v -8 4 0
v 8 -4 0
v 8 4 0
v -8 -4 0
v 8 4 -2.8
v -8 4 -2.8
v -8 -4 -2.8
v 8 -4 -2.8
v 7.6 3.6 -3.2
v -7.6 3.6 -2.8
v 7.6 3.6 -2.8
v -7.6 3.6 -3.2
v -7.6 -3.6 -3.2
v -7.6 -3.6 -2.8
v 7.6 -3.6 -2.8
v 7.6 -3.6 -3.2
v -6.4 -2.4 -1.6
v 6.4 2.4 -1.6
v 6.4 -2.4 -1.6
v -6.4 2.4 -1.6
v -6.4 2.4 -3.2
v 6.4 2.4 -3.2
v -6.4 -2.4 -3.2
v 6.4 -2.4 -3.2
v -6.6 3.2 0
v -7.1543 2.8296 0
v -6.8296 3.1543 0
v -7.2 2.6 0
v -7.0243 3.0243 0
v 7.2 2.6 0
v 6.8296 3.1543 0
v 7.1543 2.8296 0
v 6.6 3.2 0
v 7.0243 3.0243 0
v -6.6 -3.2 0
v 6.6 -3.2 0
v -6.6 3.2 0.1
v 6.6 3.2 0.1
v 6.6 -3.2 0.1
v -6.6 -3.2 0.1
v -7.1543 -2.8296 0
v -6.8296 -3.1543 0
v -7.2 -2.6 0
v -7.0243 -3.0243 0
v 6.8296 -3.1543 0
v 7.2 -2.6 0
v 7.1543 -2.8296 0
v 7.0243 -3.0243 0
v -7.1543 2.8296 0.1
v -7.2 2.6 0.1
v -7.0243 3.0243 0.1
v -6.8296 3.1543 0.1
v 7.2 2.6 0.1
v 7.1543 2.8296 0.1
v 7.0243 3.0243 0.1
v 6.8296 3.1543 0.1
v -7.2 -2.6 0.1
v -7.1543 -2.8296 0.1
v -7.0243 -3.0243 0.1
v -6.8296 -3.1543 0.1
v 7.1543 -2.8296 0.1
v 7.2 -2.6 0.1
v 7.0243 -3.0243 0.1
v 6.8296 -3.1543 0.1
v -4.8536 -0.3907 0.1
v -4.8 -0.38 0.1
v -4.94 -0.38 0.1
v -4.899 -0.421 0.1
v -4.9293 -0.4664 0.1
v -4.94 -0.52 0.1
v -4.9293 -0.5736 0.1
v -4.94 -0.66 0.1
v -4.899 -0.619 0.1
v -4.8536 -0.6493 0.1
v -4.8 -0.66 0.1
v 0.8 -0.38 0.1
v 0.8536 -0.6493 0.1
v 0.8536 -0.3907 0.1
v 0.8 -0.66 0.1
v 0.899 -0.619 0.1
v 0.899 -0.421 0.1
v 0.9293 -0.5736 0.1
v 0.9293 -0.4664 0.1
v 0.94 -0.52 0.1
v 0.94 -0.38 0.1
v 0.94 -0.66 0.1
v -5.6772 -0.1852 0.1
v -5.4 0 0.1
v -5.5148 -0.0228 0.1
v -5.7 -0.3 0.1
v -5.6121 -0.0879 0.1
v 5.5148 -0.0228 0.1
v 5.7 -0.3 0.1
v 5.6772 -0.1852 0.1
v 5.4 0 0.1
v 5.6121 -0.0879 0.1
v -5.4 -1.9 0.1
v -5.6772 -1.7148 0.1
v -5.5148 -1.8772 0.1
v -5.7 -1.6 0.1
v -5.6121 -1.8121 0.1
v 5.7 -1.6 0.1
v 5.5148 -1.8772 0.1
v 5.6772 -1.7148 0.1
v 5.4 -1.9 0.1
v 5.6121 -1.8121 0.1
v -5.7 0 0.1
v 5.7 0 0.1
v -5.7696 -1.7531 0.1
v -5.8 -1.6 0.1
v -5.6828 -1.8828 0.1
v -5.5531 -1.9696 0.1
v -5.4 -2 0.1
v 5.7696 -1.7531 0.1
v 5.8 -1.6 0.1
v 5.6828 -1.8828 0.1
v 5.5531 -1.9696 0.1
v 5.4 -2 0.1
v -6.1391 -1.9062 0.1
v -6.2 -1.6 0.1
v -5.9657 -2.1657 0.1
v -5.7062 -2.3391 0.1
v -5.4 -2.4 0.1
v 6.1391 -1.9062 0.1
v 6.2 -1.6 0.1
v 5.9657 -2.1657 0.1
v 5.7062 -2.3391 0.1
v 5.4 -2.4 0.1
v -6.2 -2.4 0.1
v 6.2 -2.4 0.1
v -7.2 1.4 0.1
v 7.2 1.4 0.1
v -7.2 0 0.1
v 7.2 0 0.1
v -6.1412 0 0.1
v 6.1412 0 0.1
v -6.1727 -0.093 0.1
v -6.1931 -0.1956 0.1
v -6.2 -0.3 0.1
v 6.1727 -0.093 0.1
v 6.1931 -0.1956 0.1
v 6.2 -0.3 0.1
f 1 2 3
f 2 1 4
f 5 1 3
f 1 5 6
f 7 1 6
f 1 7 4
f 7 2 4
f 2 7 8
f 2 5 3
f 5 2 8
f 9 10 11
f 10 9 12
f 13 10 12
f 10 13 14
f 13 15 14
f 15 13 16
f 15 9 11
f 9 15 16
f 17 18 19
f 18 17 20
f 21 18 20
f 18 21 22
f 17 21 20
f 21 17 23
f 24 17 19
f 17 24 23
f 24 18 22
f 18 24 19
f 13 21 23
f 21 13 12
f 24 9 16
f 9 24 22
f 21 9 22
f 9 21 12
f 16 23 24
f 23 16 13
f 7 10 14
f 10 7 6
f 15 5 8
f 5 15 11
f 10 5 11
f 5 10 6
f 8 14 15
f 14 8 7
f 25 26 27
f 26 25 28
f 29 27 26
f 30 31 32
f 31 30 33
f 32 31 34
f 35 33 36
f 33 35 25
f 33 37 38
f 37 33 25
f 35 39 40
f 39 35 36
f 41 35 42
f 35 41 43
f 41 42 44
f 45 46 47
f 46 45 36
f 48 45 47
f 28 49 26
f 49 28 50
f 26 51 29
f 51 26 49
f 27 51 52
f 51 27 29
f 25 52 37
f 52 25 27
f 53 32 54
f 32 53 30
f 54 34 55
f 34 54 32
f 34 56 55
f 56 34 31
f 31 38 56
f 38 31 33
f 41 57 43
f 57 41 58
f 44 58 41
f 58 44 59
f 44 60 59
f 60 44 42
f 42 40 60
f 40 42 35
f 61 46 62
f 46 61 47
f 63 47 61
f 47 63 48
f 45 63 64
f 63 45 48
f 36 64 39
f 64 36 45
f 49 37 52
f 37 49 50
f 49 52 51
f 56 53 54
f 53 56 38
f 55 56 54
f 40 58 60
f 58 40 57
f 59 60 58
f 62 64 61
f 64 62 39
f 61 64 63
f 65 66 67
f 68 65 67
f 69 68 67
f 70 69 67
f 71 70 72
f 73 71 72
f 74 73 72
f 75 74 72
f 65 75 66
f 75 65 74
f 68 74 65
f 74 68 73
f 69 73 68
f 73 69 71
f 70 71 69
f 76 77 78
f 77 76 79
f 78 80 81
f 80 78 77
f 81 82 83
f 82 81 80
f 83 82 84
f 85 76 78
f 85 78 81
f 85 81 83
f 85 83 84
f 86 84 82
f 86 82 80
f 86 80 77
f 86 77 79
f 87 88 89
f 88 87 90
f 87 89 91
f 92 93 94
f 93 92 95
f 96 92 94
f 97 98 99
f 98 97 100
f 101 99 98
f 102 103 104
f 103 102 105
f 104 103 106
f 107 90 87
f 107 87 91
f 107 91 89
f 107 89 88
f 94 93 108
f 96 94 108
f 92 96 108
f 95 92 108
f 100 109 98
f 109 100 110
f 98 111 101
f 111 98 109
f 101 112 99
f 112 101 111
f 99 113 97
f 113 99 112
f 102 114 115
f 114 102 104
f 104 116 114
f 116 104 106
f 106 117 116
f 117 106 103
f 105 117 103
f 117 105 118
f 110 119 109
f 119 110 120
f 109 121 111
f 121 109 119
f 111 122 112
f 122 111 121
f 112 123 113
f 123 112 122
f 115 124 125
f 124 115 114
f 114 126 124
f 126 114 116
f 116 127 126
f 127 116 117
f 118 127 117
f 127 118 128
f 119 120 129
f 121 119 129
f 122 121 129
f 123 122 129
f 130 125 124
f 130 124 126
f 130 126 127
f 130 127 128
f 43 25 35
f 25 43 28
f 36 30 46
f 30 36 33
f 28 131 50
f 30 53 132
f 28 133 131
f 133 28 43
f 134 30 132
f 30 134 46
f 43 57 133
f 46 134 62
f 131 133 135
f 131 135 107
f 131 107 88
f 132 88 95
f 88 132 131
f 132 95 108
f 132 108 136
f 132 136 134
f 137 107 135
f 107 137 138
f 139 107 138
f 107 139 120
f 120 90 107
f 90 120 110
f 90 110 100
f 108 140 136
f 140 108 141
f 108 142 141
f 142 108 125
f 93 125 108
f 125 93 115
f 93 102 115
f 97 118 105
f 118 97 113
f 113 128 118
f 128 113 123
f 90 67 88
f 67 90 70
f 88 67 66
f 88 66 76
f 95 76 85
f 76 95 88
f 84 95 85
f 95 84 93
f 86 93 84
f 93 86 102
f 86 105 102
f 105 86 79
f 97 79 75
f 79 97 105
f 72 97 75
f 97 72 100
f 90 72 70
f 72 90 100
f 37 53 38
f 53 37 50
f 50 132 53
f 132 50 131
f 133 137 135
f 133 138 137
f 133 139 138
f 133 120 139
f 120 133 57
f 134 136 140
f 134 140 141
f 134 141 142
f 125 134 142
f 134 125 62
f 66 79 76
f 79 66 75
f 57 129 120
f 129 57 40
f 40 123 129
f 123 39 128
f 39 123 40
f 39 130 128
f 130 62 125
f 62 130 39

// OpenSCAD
// file: ../p/box5.scad
use <../lib.scad>
function ldraw_lib__box5() = [
// 0 Box with 5 Faces and All Edges
// 0 Name: box5.dat
// 0 Author: James Jessiman
// 0 !LDRAW_ORG Primitive UPDATE 2012-01
// 0 !LICENSE Licensed under CC BY 4.0 : see CAreadme.txt
// 
// 0 BFC CERTIFY CCW
  [0,"BFC","CERTIFY"],
  [0,"BFC","CCW"],
// 
// 0 !HISTORY 2002-04-03 [sbliss] Modified for BFC compliance
// 0 !HISTORY 2002-04-25 [PTadmin] Official Update 2002-02
// 0 !HISTORY 2007-06-24 [PTadmin] Header formatted for Contributor Agreement
// 0 !HISTORY 2008-07-01 [PTadmin] Official Update 2008-01
// 0 !HISTORY 2012-02-16 [Philo] Changed to CCW
// 0 !HISTORY 2012-03-30 [PTadmin] Official Update 2012-01
// 
// 
// 2 24 1 1 1 -1 1 1
  [2,24,1,1,1,-1,1,1],
// 2 24 -1 1 1 -1 1 -1
  [2,24,-1,1,1,-1,1,-1],
// 2 24 -1 1 -1 1 1 -1
  [2,24,-1,1,-1,1,1,-1],
// 2 24 1 1 -1 1 1 1
  [2,24,1,1,-1,1,1,1],
// 2 24 1 0 1 -1 0 1
  [2,24,1,0,1,-1,0,1],
// 2 24 -1 0 1 -1 0 -1
  [2,24,-1,0,1,-1,0,-1],
// 2 24 -1 0 -1 1 0 -1
  [2,24,-1,0,-1,1,0,-1],
// 2 24 1 0 -1 1 0 1
  [2,24,1,0,-1,1,0,1],
// 2 24 1 0 1 1 1 1
  [2,24,1,0,1,1,1,1],
// 2 24 -1 0 1 -1 1 1
  [2,24,-1,0,1,-1,1,1],
// 2 24 1 0 -1 1 1 -1
  [2,24,1,0,-1,1,1,-1],
// 2 24 -1 0 -1 -1 1 -1
  [2,24,-1,0,-1,-1,1,-1],
// 4 16 -1 1 1 1 1 1 1 1 -1 -1 1 -1
  [4,16,-1,1,1,1,1,1,1,1,-1,-1,1,-1],
// 4 16 -1 1 1 -1 0 1 1 0 1 1 1 1
  [4,16,-1,1,1,-1,0,1,1,0,1,1,1,1],
// 4 16 -1 1 -1 -1 0 -1 -1 0 1 -1 1 1
  [4,16,-1,1,-1,-1,0,-1,-1,0,1,-1,1,1],
// 4 16 1 1 -1 1 0 -1 -1 0 -1 -1 1 -1
  [4,16,1,1,-1,1,0,-1,-1,0,-1,-1,1,-1],
// 4 16 1 1 1 1 0 1 1 0 -1 1 1 -1
  [4,16,1,1,1,1,0,1,1,0,-1,1,1,-1],
];
module ldraw_lib__box5(step=0, col=false, unit=2/5, alt=false, line=0.2, solid=!$preview)
    makepoly(ldraw_lib__box5(), step=step, col=col, unit=unit, alt=alt, line=line, solid=solid);
ldraw_lib__box5(line=0.2);
// file: ../p/box4.scad
use <../lib.scad>
function ldraw_lib__box4() = [
// 0 Box with 4 Faces (2 Parallel Pairs) and All Edges
// 0 Name: box4.dat
// 0 Author: James Jessiman
// 0 !LDRAW_ORG Primitive UPDATE 2012-01
// 0 !LICENSE Licensed under CC BY 4.0 : see CAreadme.txt
// 
// 0 BFC CERTIFY CCW
  [0,"BFC","CERTIFY"],
  [0,"BFC","CCW"],
// 
// 0 !HISTORY 2002-04-03 [sbliss] Modified for BFC compliance
// 0 !HISTORY 2002-04-25 [PTadmin] Official Update 2002-02
// 0 !HISTORY 2007-06-24 [PTadmin] Header formatted for Contributor Agreement
// 0 !HISTORY 2008-07-01 [PTadmin] Official Update 2008-01
// 0 !HISTORY 2012-02-16 [Philo] Changed to CCW
// 0 !HISTORY 2012-03-30 [PTadmin] Official Update 2012-01
// 
// 
// 2 24 1 1 1 -1 1 1
  [2,24,1,1,1,-1,1,1],
// 2 24 -1 1 1 -1 1 -1
  [2,24,-1,1,1,-1,1,-1],
// 2 24 -1 1 -1 1 1 -1
  [2,24,-1,1,-1,1,1,-1],
// 2 24 1 1 -1 1 1 1
  [2,24,1,1,-1,1,1,1],
// 2 24 1 0 1 -1 0 1
  [2,24,1,0,1,-1,0,1],
// 2 24 -1 0 1 -1 0 -1
  [2,24,-1,0,1,-1,0,-1],
// 2 24 -1 0 -1 1 0 -1
  [2,24,-1,0,-1,1,0,-1],
// 2 24 1 0 -1 1 0 1
  [2,24,1,0,-1,1,0,1],
// 2 24 1 0 1 1 1 1
  [2,24,1,0,1,1,1,1],
// 2 24 -1 0 1 -1 1 1
  [2,24,-1,0,1,-1,1,1],
// 2 24 1 0 -1 1 1 -1
  [2,24,1,0,-1,1,1,-1],
// 2 24 -1 0 -1 -1 1 -1
  [2,24,-1,0,-1,-1,1,-1],
// 4 16 -1 1 1 -1 0 1 1 0 1 1 1 1
  [4,16,-1,1,1,-1,0,1,1,0,1,1,1,1],
// 4 16 -1 1 -1 -1 0 -1 -1 0 1 -1 1 1
  [4,16,-1,1,-1,-1,0,-1,-1,0,1,-1,1,1],
// 4 16 1 1 -1 1 0 -1 -1 0 -1 -1 1 -1
  [4,16,1,1,-1,1,0,-1,-1,0,-1,-1,1,-1],
// 4 16 1 1 1 1 0 1 1 0 -1 1 1 -1
  [4,16,1,1,1,1,0,1,1,0,-1,1,1,-1],
];
module ldraw_lib__box4(step=0, col=false, unit=2/5, alt=false, line=0.2, solid=!$preview)
    makepoly(ldraw_lib__box4(), step=step, col=col, unit=unit, alt=alt, line=line, solid=solid);
ldraw_lib__box4(line=0.2);
// file: ../p/box3u12.scad
use <../lib.scad>
function ldraw_lib__box3u12() = [
// 0 Box with 3 Parallel Faces without Any Edges
// 0 Name: box3u12.dat
// 0 Author: J.C. Tchang [tchang]
// 0 !LDRAW_ORG Primitive UPDATE 2014-02
// 0 !LICENSE Licensed under CC BY 4.0 : see CAreadme.txt
// 
// 0 BFC CERTIFY CCW
  [0,"BFC","CERTIFY"],
  [0,"BFC","CCW"],
// 
// 0 !HISTORY 2014-12-23 [PTadmin] Official Update 2014-02
// 
// 
// 4 16 -1 1 1 1 1 1 1 1 -1 -1 1 -1
  [4,16,-1,1,1,1,1,1,1,1,-1,-1,1,-1],
// 4 16 -1 1 1 -1 0 1 1 0 1 1 1 1
  [4,16,-1,1,1,-1,0,1,1,0,1,1,1,1],
// 4 16 1 1 -1 1 0 -1 -1 0 -1 -1 1 -1
  [4,16,1,1,-1,1,0,-1,-1,0,-1,-1,1,-1],
];
module ldraw_lib__box3u12(step=0, col=false, unit=2/5, alt=false, line=0.2, solid=!$preview)
    makepoly(ldraw_lib__box3u12(), step=step, col=col, unit=unit, alt=alt, line=line, solid=solid);
ldraw_lib__box3u12(line=0.2);
// file: ../p/2-4ndis.scad
use <../lib.scad>
function ldraw_lib__2_4ndis() = [
// 0 Disc Negative 0.5
// 0 Name: 2-4ndis.dat
// 0 Author: James Jessiman
// 0 !LDRAW_ORG Primitive UPDATE 2012-01
// 0 !LICENSE Licensed under CC BY 4.0 : see CAreadme.txt
// 
// 0 BFC CERTIFY CCW
  [0,"BFC","CERTIFY"],
  [0,"BFC","CCW"],
// 
// 0 !HISTORY 2002-03-23 [sbliss] Added BFC statement; compacted code
// 0 !HISTORY 2002-04-25 [PTadmin] Official Update 2002-02
// 0 !HISTORY 2007-06-24 [PTadmin] Header formatted for Contributor Agreement
// 0 !HISTORY 2008-07-01 [PTadmin] Official Update 2008-01
// 0 !HISTORY 2012-02-16 [Philo] Changed to CCW
// 0 !HISTORY 2012-03-30 [PTadmin] Official Update 2012-01
// 
// 
// 3 16 0.9239 0 0.3827 1 0 0 1 0 1
  [3,16,0.9239,0,0.3827,1,0,0,1,0,1],
// 3 16 0.7071 0 0.7071 0.9239 0 0.3827 1 0 1
  [3,16,0.7071,0,0.7071,0.9239,0,0.3827,1,0,1],
// 3 16 0.3827 0 0.9239 0.7071 0 0.7071 1 0 1
  [3,16,0.3827,0,0.9239,0.7071,0,0.7071,1,0,1],
// 3 16 0 0 1 0.3827 0 0.9239 1 0 1
  [3,16,0,0,1,0.3827,0,0.9239,1,0,1],
// 3 16 -0.3827 0 0.9239 0 0 1 -1 0 1
  [3,16,-0.3827,0,0.9239,0,0,1,-1,0,1],
// 3 16 -0.7071 0 0.7071 -0.3827 0 0.9239 -1 0 1
  [3,16,-0.7071,0,0.7071,-0.3827,0,0.9239,-1,0,1],
// 3 16 -0.9239 0 0.3827 -0.7071 0 0.7071 -1 0 1
  [3,16,-0.9239,0,0.3827,-0.7071,0,0.7071,-1,0,1],
// 3 16 -1 0 0 -0.9239 0 0.3827 -1 0 1
  [3,16,-1,0,0,-0.9239,0,0.3827,-1,0,1],
];
module ldraw_lib__2_4ndis(step=0, col=false, unit=2/5, alt=false, line=0.2, solid=!$preview)
    makepoly(ldraw_lib__2_4ndis(), step=step, col=col, unit=unit, alt=alt, line=line, solid=solid);
ldraw_lib__2_4ndis(line=0.2);
// file: ../p/2-4chrd.scad
use <../lib.scad>
function ldraw_lib__2_4chrd() = [
// 0 Chord 0.5
// 0 Name: 2-4chrd.dat
// 0 Author: Philippe Hurbain [Philo]
// 0 !LDRAW_ORG Primitive UPDATE 2014-01
// 0 !LICENSE Licensed under CC BY 4.0 : see CAreadme.txt
// 
// 0 BFC CERTIFY CCW
  [0,"BFC","CERTIFY"],
  [0,"BFC","CCW"],
// 
// 0 !HISTORY 2014-06-21 [PTadmin] Official Update 2014-01
// 
// 
// 4 16 0.9239 0 0.3827 -0.9239 0 0.3827 -1 0 0 1 0 0
  [4,16,0.9239,0,0.3827,-0.9239,0,0.3827,-1,0,0,1,0,0],
// 4 16 0.7071 0 0.7071 -0.7071 0 0.7071 -0.9239 0 0.3827 0.9239 0 0.3827
  [4,16,0.7071,0,0.7071,-0.7071,0,0.7071,-0.9239,0,0.3827,0.9239,0,0.3827],
// 4 16 0.3827 0 0.9239 -0.3827 0 0.9239 -0.7071 0 0.7071 0.7071 0 0.7071
  [4,16,0.3827,0,0.9239,-0.3827,0,0.9239,-0.7071,0,0.7071,0.7071,0,0.7071],
// 3 16 0 0 1 -0.3827 0 0.9239 0.3827 0 0.9239
  [3,16,0,0,1,-0.3827,0,0.9239,0.3827,0,0.9239],
];
module ldraw_lib__2_4chrd(step=0, col=false, unit=2/5, alt=false, line=0.2, solid=!$preview)
    makepoly(ldraw_lib__2_4chrd(), step=step, col=col, unit=unit, alt=alt, line=line, solid=solid);
ldraw_lib__2_4chrd(line=0.2);
// file: ../p/1-4ring3.scad
use <../lib.scad>
function ldraw_lib__1_4ring3() = [
// 0 Ring  3 x 0.25
// 0 Name: 1-4ring3.dat
// 0 Author: Willy Tschager [Holly-Wood]
// 0 !LDRAW_ORG Primitive UPDATE 2024-01
// 0 !LICENSE Licensed under CC BY 4.0 : see CAreadme.txt
// 
// 0 BFC CERTIFY CCW
  [0,"BFC","CERTIFY"],
  [0,"BFC","CCW"],
// 
// 0 !HISTORY 1999-07-05 [PTadmin] Official Update 1999-05
// 0 !HISTORY 2003-01-21 [cavehop] Update Added BFC and 1 digit of significance
// 0 !HISTORY 2003-05-21 [cavehop] Corrected values as indicated by pneaster
// 0 !HISTORY 2003-06-12 [cavehop] Re-corrected values as indicated by pneaster
// 0 !HISTORY 2003-08-01 [PTadmin] Official Update 2003-02
// 0 !HISTORY 2007-06-22 [PTadmin] Header formatted for Contributor Agreement
// 0 !HISTORY 2008-07-01 [PTadmin] Official Update 2008-01
// 0 !HISTORY 2012-02-16 [Philo] Changed to CCW
// 0 !HISTORY 2012-03-30 [PTadmin] Official Update 2012-01
// 0 !HISTORY 2024-01-04 [Holly-Wood] Complete re-write, original by Karim Nassar
// 0 !HISTORY 2024-01-29 [OrionP] Official Update 2024-01
// 
// 4 16 4 0 0 3.6956 0 1.5308 2.7717 0 1.1481 3 0 0
  [4,16,4,0,0,3.6956,0,1.5308,2.7717,0,1.1481,3,0,0],
// 4 16 3.6956 0 1.5308 2.8284 0 2.8284 2.1213 0 2.1213 2.7717 0 1.1481
  [4,16,3.6956,0,1.5308,2.8284,0,2.8284,2.1213,0,2.1213,2.7717,0,1.1481],
// 4 16 2.8284 0 2.8284 1.5308 0 3.6956 1.1481 0 2.7717 2.1213 0 2.1213
  [4,16,2.8284,0,2.8284,1.5308,0,3.6956,1.1481,0,2.7717,2.1213,0,2.1213],
// 4 16 1.5308 0 3.6956 0 0 4 0 0 3 1.1481 0 2.7717
  [4,16,1.5308,0,3.6956,0,0,4,0,0,3,1.1481,0,2.7717],
// 0 // Build by LDPartEditor (PrimGen 2.X)
];
module ldraw_lib__1_4ring3(step=0, col=false, unit=2/5, alt=false, line=0.2, solid=!$preview)
    makepoly(ldraw_lib__1_4ring3(), step=step, col=col, unit=unit, alt=alt, line=line, solid=solid);
ldraw_lib__1_4ring3(line=0.2);
// file: ../p/1-4ring1.scad
use <../lib.scad>
function ldraw_lib__1_4ring1() = [
// 0 Ring  1 x 0.25
// 0 Name: 1-4ring1.dat
// 0 Author: Chris Dee [cwdee]
// 0 !LDRAW_ORG Primitive UPDATE 2012-01
// 0 !LICENSE Licensed under CC BY 4.0 : see CAreadme.txt
// 
// 0 BFC CERTIFY CCW
  [0,"BFC","CERTIFY"],
  [0,"BFC","CCW"],
// 
// 0 !HISTORY 2000-05-07 [PTadmin] Official Update 2000-01
// 0 !HISTORY 2002-11-22 [hafhead] Added BFC statement
// 0 !HISTORY 2002-11-30 [PTadmin] Official Update 2002-05
// 0 !HISTORY 2007-06-22 [PTadmin] Header formatted for Contributor Agreement
// 0 !HISTORY 2008-07-01 [PTadmin] Official Update 2008-01
// 0 !HISTORY 2012-02-16 [Philo] Changed to CCW
// 0 !HISTORY 2012-03-30 [PTadmin] Official Update 2012-01
// 
// 
// 4 16 2 0 0 1.8478 0 0.7654 0.9239 0 0.3827 1 0 0
  [4,16,2,0,0,1.8478,0,0.7654,0.9239,0,0.3827,1,0,0],
// 4 16 1.8478 0 0.7654 1.4142 0 1.4142 0.7071 0 0.7071 0.9239 0 0.3827
  [4,16,1.8478,0,0.7654,1.4142,0,1.4142,0.7071,0,0.7071,0.9239,0,0.3827],
// 4 16 1.4142 0 1.4142 0.7654 0 1.8478 0.3827 0 0.9239 0.7071 0 0.7071
  [4,16,1.4142,0,1.4142,0.7654,0,1.8478,0.3827,0,0.9239,0.7071,0,0.7071],
// 4 16 0.7654 0 1.8478 0 0 2 0 0 1 0.3827 0 0.9239
  [4,16,0.7654,0,1.8478,0,0,2,0,0,1,0.3827,0,0.9239],
];
module ldraw_lib__1_4ring1(step=0, col=false, unit=2/5, alt=false, line=0.2, solid=!$preview)
    makepoly(ldraw_lib__1_4ring1(), step=step, col=col, unit=unit, alt=alt, line=line, solid=solid);
ldraw_lib__1_4ring1(line=0.2);
// file: ../p/1-4ndis.scad
use <../lib.scad>
function ldraw_lib__1_4ndis() = [
// 0 Disc Negative 0.25
// 0 Name: 1-4ndis.dat
// 0 Author: James Jessiman
// 0 !LDRAW_ORG Primitive UPDATE 2012-01
// 0 !LICENSE Licensed under CC BY 4.0 : see CAreadme.txt
// 
// 0 BFC CERTIFY CCW
  [0,"BFC","CERTIFY"],
  [0,"BFC","CCW"],
// 
// 0 !HISTORY 2002-03-23 [sbliss] Added BFC Statement
// 0 !HISTORY 2002-04-25 [PTadmin] Official Update 2002-02
// 0 !HISTORY 2007-06-22 [PTadmin] Header formatted for Contributor Agreement
// 0 !HISTORY 2008-07-01 [PTadmin] Official Update 2008-01
// 0 !HISTORY 2012-02-16 [Philo] Changed to CCW
// 0 !HISTORY 2012-03-30 [PTadmin] Official Update 2012-01
// 
// 
// 3 16 0.9239 0 0.3827 1 0 0 1 0 1
  [3,16,0.9239,0,0.3827,1,0,0,1,0,1],
// 3 16 0.7071 0 0.7071 0.9239 0 0.3827 1 0 1
  [3,16,0.7071,0,0.7071,0.9239,0,0.3827,1,0,1],
// 3 16 0.3827 0 0.9239 0.7071 0 0.7071 1 0 1
  [3,16,0.3827,0,0.9239,0.7071,0,0.7071,1,0,1],
// 3 16 0 0 1 0.3827 0 0.9239 1 0 1
  [3,16,0,0,1,0.3827,0,0.9239,1,0,1],
];
module ldraw_lib__1_4ndis(step=0, col=false, unit=2/5, alt=false, line=0.2, solid=!$preview)
    makepoly(ldraw_lib__1_4ndis(), step=step, col=col, unit=unit, alt=alt, line=line, solid=solid);
ldraw_lib__1_4ndis(line=0.2);
// file: ../p/1-4cyli.scad
use <../lib.scad>
function ldraw_lib__1_4cyli() = [
// 0 Cylinder 0.25
// 0 Name: 1-4cyli.dat
// 0 Author: James Jessiman
// 0 !LDRAW_ORG Primitive UPDATE 2012-01
// 0 !LICENSE Licensed under CC BY 4.0 : see CAreadme.txt
// 
// 0 BFC CERTIFY CCW
  [0,"BFC","CERTIFY"],
  [0,"BFC","CCW"],
// 
// 0 !HISTORY 2002-03-23 [sbliss] Added BFC statement.
// 0 !HISTORY 2002-04-25 [PTadmin] Official Update 2002-02
// 0 !HISTORY 2007-06-22 [PTadmin] Header formatted for Contributor Agreement
// 0 !HISTORY 2008-07-01 [PTadmin] Official Update 2008-01
// 0 !HISTORY 2012-02-16 [Philo] Changed to CCW
// 0 !HISTORY 2012-03-30 [PTadmin] Official Update 2012-01
// 
// 
// 4 16 1 1 0 0.9239 1 0.3827 0.9239 0 0.3827 1 0 0
  [4,16,1,1,0,0.9239,1,0.3827,0.9239,0,0.3827,1,0,0],
// 5 24 1 0 0 1 1 0 0.9239 0 0.3827 1 0 -1
  [5,24,1,0,0,1,1,0,0.9239,0,0.3827,1,0,-1],
// 4 16 0.9239 1 0.3827 0.7071 1 0.7071 0.7071 0 0.7071 0.9239 0 0.3827
  [4,16,0.9239,1,0.3827,0.7071,1,0.7071,0.7071,0,0.7071,0.9239,0,0.3827],
// 5 24 0.9239 0 0.3827 0.9239 1 0.3827 0.7071 0 0.7071 1 0 0
  [5,24,0.9239,0,0.3827,0.9239,1,0.3827,0.7071,0,0.7071,1,0,0],
// 4 16 0.7071 1 0.7071 0.3827 1 0.9239 0.3827 0 0.9239 0.7071 0 0.7071
  [4,16,0.7071,1,0.7071,0.3827,1,0.9239,0.3827,0,0.9239,0.7071,0,0.7071],
// 5 24 0.7071 0 0.7071 0.7071 1 0.7071 0.3827 0 0.9239 0.9239 0 0.3827
  [5,24,0.7071,0,0.7071,0.7071,1,0.7071,0.3827,0,0.9239,0.9239,0,0.3827],
// 4 16 0.3827 1 0.9239 0 1 1 0 0 1 0.3827 0 0.9239
  [4,16,0.3827,1,0.9239,0,1,1,0,0,1,0.3827,0,0.9239],
// 5 24 0.3827 0 0.9239 0.3827 1 0.9239 0 0 1 0.7071 0 0.7071
  [5,24,0.3827,0,0.9239,0.3827,1,0.9239,0,0,1,0.7071,0,0.7071],
// 5 24 0 0 1 0 1 1 0.3827 0 0.9239 -1 0 1
  [5,24,0,0,1,0,1,1,0.3827,0,0.9239,-1,0,1],
];
module ldraw_lib__1_4cyli(step=0, col=false, unit=2/5, alt=false, line=0.2, solid=!$preview)
    makepoly(ldraw_lib__1_4cyli(), step=step, col=col, unit=unit, alt=alt, line=line, solid=solid);
ldraw_lib__1_4cyli(line=0.2);
// file: ../p/1-4chrd.scad
use <../lib.scad>
function ldraw_lib__1_4chrd() = [
// 0 Chord 0.25
// 0 Name: 1-4chrd.dat
// 0 Author: Max Martin Richter [MMR1988]
// 0 !LDRAW_ORG Primitive UPDATE 2023-05
// 0 !LICENSE Licensed under CC BY 4.0 : see CAreadme.txt
// 
// 0 BFC CERTIFY CCW
  [0,"BFC","CERTIFY"],
  [0,"BFC","CCW"],
// 
// 0 !HISTORY 2004-04-22 [PTadmin] Official Update 2004-02
// 0 !HISTORY 2007-10-09 [PTadmin] Header formatted for Contributor Agreement
// 0 !HISTORY 2008-07-01 [PTadmin] Official Update 2008-01
// 0 !HISTORY 2012-08-02 [MMR1988] Re-creation with PrimGen2 and Rectifier
// 0 !HISTORY 2012-08-09 [PTadmin] Official Update 2012-02
// 0 !HISTORY 2023-10-27 [OrionP] Change author to MMR1988 from hafhead
// 0 !HISTORY 2023-10-31 [OrionP] Official Update 2023-05
// 
// 4 16 0.9239 0 0.3827 0.3827 0 0.9239 0 0 1 1 0 0
  [4,16,0.9239,0,0.3827,0.3827,0,0.9239,0,0,1,1,0,0],
// 3 16 0.7071 0 0.7071 0.3827 0 0.9239 0.9239 0 0.3827
  [3,16,0.7071,0,0.7071,0.3827,0,0.9239,0.9239,0,0.3827],
];
module ldraw_lib__1_4chrd(step=0, col=false, unit=2/5, alt=false, line=0.2, solid=!$preview)
    makepoly(ldraw_lib__1_4chrd(), step=step, col=col, unit=unit, alt=alt, line=line, solid=solid);
ldraw_lib__1_4chrd(line=0.2);
// file: s/3069bs01.scad
use <../../lib.scad>
use <../../p/box4.scad>
use <../../p/box5.scad>
function ldraw_lib__s__3069bs01() = [
// 0 ~Tile  1 x  2 with Groove without Top Face
// 0 Name: s\3069bs01.dat
// 0 Author: Santeri Piippo [arezey]
// 0 !LDRAW_ORG Subpart UPDATE 2010-02
// 0 !LICENSE Licensed under CC BY 4.0 : see CAreadme.txt
// 
// 0 BFC CERTIFY CCW
  [0,"BFC","CERTIFY"],
  [0,"BFC","CCW"],
// 
// 0 !HISTORY 2010-07-05 [PTadmin] Official Update 2010-02
// 
// 
// 1 16 0 0 0 20 0 0 0 7 0 0 0 10 box4.dat
  [1,16,0,0,0,20,0,0,0,7,0,0,0,10, ldraw_lib__box4()],
// 1 16 0 7 0 19 0 0 0 1 0 0 0 9 box4.dat
  [1,16,0,7,0,19,0,0,0,1,0,0,0,9, ldraw_lib__box4()],
// 0 BFC INVERTNEXT
  [0,"BFC","INVERTNEXT"],
// 1 16 0 8 0 16 0 0 0 -4 0 0 0 6 box5.dat
  [1,16,0,8,0,16,0,0,0,-4,0,0,0,6, ldraw_lib__box5()],
// 4 16 -19 8 9 -16 8 6 -16 8 -6 -19 8 -9
  [4,16,-19,8,9,-16,8,6,-16,8,-6,-19,8,-9],
// 4 16 19 8 -9 16 8 -6 16 8 6 19 8 9
  [4,16,19,8,-9,16,8,-6,16,8,6,19,8,9],
// 4 16 19 8 9 16 8 6 -16 8 6 -19 8 9
  [4,16,19,8,9,16,8,6,-16,8,6,-19,8,9],
// 4 16 -19 8 -9 -16 8 -6 16 8 -6 19 8 -9
  [4,16,-19,8,-9,-16,8,-6,16,8,-6,19,8,-9],
// 4 16 -20 7 10 -19 7 9 -19 7 -9 -20 7 -10
  [4,16,-20,7,10,-19,7,9,-19,7,-9,-20,7,-10],
// 4 16 20 7 -10 19 7 -9 19 7 9 20 7 10
  [4,16,20,7,-10,19,7,-9,19,7,9,20,7,10],
// 4 16 20 7 10 19 7 9 -19 7 9 -20 7 10
  [4,16,20,7,10,19,7,9,-19,7,9,-20,7,10],
// 4 16 -20 7 -10 -19 7 -9 19 7 -9 20 7 -10
  [4,16,-20,7,-10,-19,7,-9,19,7,-9,20,7,-10],
// 0 //
];
module ldraw_lib__s__3069bs01(step=0, col=false, unit=2/5, alt=false, line=0.2, solid=!$preview)
    makepoly(ldraw_lib__s__3069bs01(), step=step, col=col, unit=unit, alt=alt, line=line, solid=solid);
ldraw_lib__s__3069bs01(line=0.2);
// file: 3069b.scad
use <../lib.scad>
use <s/3069bs01.scad>
function ldraw_lib__3069b() = [
// 0 Tile  1 x  2 with Groove
// 0 Name: 3069b.dat
// 0 Author: Santeri Piippo [arezey]
// 0 !LDRAW_ORG Part UPDATE 2010-02
// 0 !LICENSE Licensed under CC BY 4.0 : see CAreadme.txt
// 
// 0 BFC CERTIFY CCW
  [0,"BFC","CERTIFY"],
  [0,"BFC","CCW"],
// 
// 0 !KEYWORDS BrickLink 3069
// 
// 0 !HISTORY 2010-07-05 [PTadmin] Official Update 2010-02
// 
// 
// 4 16 20 0 -10 20 0 10 -20 0 10 -20 0 -10
  [4,16,20,0,-10,20,0,10,-20,0,10,-20,0,-10],
// 1 16 0 0 0 1 0 0 0 1 0 0 0 1 s\3069bs01.dat
  [1,16,0,0,0,1,0,0,0,1,0,0,0,1, ldraw_lib__s__3069bs01()],
// 0 //
];
module ldraw_lib__3069b(step=0, col=false, unit=2/5, alt=false, line=0.2, solid=!$preview)
    makepoly(ldraw_lib__3069b(), step=step, col=col, unit=unit, alt=alt, line=line, solid=solid);
ldraw_lib__3069b(line=0.2);
// main file
use <../lib.scad>
use <3069b.scad>
use <6142617h.scad>
function ldraw_lib__3069bd2y() = [
// 0 Tile  1 x  2 with Black Stripe and Brakelamp on Red Background Sticker
// 0 Name: 3069bd2y.dat
// 0 Author: Alfred Schmitz [AlfredS]
// 0 !LDRAW_ORG Shortcut UPDATE 2026-09
// 0 !LICENSE Licensed under CC BY 4.0 : see CAreadme.txt
// 
// 0 BFC CERTIFY CCW
  [0,"BFC","CERTIFY"],
  [0,"BFC","CCW"],
// 
// 0 !CATEGORY Sticker Shortcut
// 0 !KEYWORDS Camaro, Chevrolet, Drag, Race, Set 75874, Speed Champions
// 
// 0 !HISTORY 2026-09-30 [OrionP] Official Update 2026-09
// 
// 1 16 0 0 0 1 0 0 0 1 0 0 0 1 3069b.dat
  [1,16,0,0,0,1,0,0,0,1,0,0,0,1, ldraw_lib__3069b()],
// 1 16 0 0 0 1 0 0 0 1 0 0 0 1 6142617h.dat
  [1,16,0,0,0,1,0,0,0,1,0,0,0,1, ldraw_lib__6142617h()],
];
module ldraw_lib__3069bd2y(step=0, col=false, unit=2/5, alt=false, line=0.2, solid=!$preview)
    makepoly(ldraw_lib__3069bd2y(), step=step, col=col, unit=unit, alt=alt, line=line, solid=solid);
ldraw_lib__3069bd2y(line=0.2);
